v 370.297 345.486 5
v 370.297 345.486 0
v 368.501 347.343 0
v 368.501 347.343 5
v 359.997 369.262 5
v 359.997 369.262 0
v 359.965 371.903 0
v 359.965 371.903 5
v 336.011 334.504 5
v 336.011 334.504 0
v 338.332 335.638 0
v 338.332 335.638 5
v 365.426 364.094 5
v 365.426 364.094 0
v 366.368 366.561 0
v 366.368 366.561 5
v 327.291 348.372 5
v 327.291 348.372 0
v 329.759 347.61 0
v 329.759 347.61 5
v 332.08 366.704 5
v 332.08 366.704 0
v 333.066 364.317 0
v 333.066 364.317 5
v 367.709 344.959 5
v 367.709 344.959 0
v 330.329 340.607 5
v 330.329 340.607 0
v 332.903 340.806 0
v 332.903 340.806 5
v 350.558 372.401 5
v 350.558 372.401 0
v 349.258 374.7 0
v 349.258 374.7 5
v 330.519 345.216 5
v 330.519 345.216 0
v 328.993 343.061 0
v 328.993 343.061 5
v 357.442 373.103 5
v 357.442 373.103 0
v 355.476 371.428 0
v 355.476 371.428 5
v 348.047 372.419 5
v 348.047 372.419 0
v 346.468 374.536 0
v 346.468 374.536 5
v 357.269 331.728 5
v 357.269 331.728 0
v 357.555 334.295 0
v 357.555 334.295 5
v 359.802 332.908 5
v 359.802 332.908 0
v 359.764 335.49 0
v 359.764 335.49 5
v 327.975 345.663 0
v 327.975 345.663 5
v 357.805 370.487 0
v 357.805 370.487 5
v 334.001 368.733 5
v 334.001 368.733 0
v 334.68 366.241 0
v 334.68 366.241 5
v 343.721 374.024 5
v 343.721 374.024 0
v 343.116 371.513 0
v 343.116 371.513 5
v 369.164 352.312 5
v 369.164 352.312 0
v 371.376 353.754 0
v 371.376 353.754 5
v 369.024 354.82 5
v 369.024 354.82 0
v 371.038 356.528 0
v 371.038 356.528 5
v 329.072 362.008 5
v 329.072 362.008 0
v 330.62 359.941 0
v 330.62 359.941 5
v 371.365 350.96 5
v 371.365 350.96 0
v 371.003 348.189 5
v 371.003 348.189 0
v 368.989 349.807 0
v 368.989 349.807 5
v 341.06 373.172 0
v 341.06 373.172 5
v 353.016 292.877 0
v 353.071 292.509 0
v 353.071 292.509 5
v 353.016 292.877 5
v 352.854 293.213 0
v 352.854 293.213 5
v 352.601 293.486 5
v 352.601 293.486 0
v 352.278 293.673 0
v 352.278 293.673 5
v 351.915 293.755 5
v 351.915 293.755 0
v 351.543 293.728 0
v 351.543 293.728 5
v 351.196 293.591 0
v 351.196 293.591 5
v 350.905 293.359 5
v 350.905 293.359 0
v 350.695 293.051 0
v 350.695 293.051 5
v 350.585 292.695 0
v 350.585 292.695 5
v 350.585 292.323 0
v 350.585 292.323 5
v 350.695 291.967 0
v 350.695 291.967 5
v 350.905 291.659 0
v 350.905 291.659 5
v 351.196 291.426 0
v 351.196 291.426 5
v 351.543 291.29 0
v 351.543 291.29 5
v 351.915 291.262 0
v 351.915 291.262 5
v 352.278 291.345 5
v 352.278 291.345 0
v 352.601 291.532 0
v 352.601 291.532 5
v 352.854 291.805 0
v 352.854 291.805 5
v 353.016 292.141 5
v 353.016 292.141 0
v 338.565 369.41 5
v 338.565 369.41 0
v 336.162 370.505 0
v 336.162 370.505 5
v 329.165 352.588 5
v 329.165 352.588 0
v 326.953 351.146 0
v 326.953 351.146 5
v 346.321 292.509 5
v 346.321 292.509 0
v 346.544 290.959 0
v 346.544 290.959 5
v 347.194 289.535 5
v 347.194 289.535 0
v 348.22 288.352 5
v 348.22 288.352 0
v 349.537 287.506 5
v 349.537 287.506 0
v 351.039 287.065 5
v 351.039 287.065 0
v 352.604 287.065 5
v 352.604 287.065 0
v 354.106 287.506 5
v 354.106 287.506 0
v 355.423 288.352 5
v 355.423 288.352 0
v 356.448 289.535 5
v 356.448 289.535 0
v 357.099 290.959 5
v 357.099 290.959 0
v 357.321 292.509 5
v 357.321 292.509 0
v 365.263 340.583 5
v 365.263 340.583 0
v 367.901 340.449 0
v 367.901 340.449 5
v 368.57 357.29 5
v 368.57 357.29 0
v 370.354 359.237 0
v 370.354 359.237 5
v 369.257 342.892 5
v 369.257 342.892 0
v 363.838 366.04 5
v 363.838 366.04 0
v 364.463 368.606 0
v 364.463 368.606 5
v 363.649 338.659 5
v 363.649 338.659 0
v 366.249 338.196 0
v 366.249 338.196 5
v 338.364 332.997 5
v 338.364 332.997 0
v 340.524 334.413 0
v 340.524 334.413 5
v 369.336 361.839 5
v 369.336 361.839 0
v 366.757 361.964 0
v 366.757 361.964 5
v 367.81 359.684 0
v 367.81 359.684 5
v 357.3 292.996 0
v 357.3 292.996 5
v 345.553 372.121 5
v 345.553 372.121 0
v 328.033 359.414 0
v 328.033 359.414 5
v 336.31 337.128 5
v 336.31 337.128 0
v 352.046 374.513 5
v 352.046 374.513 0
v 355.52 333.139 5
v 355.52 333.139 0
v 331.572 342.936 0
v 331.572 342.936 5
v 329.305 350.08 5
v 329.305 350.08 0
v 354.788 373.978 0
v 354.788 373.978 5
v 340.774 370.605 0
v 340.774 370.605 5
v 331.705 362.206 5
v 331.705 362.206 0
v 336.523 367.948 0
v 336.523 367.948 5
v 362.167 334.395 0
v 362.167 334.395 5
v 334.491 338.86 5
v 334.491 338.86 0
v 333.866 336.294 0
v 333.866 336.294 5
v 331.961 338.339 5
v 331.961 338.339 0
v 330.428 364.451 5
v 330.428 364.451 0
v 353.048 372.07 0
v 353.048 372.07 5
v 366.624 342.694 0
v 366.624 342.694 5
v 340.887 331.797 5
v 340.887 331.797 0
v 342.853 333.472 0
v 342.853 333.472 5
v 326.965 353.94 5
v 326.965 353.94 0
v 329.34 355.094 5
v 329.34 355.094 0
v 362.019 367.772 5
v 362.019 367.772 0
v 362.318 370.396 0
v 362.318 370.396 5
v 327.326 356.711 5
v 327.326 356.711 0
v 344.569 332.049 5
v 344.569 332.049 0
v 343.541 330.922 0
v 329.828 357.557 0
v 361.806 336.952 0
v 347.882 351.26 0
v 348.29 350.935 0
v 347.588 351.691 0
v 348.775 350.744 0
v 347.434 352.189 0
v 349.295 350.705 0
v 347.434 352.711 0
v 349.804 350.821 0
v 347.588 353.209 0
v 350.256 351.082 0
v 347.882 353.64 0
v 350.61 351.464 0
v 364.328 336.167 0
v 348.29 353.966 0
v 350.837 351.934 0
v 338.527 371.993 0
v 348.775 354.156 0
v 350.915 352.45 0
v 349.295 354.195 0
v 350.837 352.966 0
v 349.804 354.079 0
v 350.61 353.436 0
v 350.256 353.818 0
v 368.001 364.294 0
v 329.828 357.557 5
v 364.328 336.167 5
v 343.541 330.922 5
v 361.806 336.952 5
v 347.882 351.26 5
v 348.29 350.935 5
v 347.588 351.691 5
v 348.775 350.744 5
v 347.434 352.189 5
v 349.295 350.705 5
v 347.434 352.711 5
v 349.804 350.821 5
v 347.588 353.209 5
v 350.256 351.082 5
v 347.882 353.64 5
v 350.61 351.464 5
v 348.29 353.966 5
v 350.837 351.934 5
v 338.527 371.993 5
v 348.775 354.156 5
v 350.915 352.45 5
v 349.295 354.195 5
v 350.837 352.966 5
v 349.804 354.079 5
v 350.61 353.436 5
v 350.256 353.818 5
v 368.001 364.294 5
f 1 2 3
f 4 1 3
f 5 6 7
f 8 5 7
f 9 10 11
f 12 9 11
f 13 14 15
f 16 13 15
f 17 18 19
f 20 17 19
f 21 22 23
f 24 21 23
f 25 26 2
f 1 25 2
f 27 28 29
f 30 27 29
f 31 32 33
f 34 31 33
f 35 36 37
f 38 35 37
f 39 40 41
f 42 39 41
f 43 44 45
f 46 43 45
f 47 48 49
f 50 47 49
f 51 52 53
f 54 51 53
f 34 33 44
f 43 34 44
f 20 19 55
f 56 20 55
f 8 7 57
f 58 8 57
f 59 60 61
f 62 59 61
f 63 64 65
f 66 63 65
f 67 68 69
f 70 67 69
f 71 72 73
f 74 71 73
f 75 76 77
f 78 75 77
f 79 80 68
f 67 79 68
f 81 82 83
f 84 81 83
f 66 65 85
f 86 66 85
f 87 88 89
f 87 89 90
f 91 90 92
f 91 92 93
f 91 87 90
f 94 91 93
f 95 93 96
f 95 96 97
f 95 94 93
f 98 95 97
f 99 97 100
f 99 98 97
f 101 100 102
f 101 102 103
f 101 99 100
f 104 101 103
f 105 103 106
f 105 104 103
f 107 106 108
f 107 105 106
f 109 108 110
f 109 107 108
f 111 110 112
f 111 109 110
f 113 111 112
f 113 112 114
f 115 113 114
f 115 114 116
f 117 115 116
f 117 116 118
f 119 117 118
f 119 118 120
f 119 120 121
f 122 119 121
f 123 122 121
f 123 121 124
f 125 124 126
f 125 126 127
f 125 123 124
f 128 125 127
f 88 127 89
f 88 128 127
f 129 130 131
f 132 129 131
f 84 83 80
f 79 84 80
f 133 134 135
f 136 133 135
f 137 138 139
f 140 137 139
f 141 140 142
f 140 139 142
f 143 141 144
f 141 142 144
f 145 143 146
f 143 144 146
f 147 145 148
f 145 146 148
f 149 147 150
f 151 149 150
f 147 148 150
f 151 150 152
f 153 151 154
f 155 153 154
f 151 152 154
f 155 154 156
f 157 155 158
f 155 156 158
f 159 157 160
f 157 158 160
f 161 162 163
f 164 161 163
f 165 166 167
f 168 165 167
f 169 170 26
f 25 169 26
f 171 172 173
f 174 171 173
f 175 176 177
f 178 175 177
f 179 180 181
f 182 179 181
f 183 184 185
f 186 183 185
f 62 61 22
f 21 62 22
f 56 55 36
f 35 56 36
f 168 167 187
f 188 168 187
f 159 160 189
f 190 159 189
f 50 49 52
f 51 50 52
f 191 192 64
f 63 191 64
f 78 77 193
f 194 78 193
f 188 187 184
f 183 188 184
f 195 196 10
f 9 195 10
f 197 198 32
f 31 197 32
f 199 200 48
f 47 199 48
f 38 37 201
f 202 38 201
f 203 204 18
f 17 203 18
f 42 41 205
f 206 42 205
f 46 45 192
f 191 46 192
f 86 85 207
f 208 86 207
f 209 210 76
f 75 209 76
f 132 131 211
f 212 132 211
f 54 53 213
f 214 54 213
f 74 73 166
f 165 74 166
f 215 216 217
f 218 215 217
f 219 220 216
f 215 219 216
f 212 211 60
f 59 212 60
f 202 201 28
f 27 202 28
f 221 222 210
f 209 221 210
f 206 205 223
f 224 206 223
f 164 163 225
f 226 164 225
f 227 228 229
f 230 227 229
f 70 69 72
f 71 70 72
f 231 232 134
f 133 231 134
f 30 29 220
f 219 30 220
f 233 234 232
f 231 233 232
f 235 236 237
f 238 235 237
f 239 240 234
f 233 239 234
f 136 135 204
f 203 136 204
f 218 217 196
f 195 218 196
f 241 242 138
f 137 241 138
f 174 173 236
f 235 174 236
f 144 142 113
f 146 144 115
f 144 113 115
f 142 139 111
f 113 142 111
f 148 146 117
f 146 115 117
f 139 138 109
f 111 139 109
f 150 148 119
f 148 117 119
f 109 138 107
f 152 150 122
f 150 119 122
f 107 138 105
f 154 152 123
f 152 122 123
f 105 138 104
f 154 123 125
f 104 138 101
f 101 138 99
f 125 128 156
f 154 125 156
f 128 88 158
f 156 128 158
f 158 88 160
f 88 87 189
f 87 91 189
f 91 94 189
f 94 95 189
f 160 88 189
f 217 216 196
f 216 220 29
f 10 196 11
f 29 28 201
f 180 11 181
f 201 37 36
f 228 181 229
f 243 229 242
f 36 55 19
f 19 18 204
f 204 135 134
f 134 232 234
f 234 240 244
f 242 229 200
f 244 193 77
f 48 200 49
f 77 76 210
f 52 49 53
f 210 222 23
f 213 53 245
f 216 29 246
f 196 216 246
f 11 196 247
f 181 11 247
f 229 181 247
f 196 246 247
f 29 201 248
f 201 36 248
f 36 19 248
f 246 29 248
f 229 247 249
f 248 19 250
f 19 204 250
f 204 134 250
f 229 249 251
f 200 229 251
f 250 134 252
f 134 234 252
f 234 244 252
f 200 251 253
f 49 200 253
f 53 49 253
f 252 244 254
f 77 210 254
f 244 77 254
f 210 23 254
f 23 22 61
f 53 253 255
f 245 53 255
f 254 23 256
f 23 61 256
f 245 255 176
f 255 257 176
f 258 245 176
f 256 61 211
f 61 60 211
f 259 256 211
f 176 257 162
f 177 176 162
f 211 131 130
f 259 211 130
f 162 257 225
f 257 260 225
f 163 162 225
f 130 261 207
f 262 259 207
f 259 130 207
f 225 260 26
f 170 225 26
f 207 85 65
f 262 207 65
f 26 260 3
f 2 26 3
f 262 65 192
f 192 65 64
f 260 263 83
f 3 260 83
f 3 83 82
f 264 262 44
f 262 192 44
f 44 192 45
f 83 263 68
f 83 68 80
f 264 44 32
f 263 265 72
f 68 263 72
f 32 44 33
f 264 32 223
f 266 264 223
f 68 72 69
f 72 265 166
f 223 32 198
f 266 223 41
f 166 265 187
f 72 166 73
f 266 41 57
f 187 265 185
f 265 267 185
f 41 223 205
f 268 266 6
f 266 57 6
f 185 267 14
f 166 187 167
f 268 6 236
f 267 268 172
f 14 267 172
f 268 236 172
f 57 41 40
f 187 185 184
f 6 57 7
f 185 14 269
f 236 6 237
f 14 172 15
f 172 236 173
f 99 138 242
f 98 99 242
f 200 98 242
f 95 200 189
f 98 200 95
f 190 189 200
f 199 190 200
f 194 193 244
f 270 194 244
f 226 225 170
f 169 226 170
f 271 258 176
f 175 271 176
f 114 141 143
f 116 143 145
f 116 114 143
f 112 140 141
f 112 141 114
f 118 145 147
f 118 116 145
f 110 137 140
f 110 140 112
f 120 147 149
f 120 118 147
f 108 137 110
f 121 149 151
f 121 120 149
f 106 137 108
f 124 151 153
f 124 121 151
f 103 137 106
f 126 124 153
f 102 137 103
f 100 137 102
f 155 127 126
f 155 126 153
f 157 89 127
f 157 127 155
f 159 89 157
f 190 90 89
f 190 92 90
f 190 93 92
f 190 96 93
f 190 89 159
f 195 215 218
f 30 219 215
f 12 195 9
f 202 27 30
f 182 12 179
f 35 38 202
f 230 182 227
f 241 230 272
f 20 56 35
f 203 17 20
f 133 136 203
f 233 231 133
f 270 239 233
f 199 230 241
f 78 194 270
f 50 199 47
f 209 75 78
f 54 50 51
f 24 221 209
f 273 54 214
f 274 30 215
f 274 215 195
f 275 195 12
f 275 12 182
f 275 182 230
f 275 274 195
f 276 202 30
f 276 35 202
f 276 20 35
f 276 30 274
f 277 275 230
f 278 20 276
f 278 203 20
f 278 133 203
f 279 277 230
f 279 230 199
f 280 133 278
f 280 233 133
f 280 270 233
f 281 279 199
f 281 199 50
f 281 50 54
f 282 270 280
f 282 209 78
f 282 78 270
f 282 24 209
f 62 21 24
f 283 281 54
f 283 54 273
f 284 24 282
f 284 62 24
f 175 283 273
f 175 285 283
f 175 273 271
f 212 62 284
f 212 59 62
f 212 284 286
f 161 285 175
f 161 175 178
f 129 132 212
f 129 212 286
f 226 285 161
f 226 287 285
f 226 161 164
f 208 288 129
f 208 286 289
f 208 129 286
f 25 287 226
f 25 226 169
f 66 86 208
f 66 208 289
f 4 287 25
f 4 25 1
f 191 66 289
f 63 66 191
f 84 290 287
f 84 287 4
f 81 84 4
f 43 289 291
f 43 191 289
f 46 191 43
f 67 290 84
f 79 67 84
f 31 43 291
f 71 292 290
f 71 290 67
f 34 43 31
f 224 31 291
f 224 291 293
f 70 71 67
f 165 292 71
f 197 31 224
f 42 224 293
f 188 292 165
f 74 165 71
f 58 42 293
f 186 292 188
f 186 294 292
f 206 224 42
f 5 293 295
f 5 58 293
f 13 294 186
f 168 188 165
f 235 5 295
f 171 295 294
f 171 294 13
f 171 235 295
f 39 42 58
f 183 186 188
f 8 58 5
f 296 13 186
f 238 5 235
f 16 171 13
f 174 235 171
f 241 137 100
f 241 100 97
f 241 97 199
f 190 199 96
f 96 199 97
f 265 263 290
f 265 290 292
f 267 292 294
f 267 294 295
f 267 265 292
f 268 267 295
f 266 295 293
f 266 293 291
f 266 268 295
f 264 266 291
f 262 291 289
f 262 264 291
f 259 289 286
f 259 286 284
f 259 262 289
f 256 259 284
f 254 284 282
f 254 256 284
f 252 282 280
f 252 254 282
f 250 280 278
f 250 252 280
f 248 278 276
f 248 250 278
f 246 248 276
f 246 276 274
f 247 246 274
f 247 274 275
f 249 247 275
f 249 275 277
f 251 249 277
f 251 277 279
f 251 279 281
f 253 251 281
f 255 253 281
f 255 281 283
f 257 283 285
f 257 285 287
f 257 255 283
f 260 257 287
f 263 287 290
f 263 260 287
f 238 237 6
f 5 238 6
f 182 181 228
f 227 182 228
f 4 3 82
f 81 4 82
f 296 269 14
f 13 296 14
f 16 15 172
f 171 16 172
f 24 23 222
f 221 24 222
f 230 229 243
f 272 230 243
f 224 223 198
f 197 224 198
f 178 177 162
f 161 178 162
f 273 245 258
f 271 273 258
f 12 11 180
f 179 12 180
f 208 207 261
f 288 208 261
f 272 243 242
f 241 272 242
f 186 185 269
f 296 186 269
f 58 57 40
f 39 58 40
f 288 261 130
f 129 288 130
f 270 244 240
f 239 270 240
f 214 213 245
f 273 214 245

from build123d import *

# Parameters (mm, degrees)
SKETCH1_R           = 1.25
SKETCH1_R_2         = 1.75
BOSS_EXTRUDE2_DEPTH = 5


with BuildPart() as part:
    # Sketch1 → Boss-Extrude2 (new body)
    with BuildSketch(Plane.XY):
        with BuildLine():
            Line((349.257683179, 374.699911371), (348.046522548, 372.418831878))
            Line((348.046522548, 372.418831878), (346.468308818, 374.536137019))
            Line((346.468308818, 374.536137019), (345.55259362, 372.121245841))
            Line((345.55259362, 372.121245841), (343.721455877, 374.024052769))
            Line((343.721455877, 374.024052769), (343.115627486, 371.513434183))
            Line((343.115627486, 371.513434183), (341.060443866, 373.171734495))
            Line((341.060443866, 373.171734495), (340.774056559, 370.604982455))
            Line((340.774056559, 370.604982455), (338.527238535, 371.992623765))
            Line((338.527238535, 371.992623765), (338.564808811, 369.410217484))
            Line((338.564808811, 369.410217484), (336.161790046, 370.505315861))
            Line((336.161790046, 370.505315861), (336.522725398, 367.947981428))
            Line((336.522725398, 367.947981428), (334.001402933, 368.733266515))
            Line((334.001402933, 368.733266515), (334.680011196, 366.241334623))
            Line((334.680011196, 366.241334623), (332.080147792, 366.704422005))
            Line((332.080147792, 366.704422005), (333.065726908, 364.317191908))
            Line((333.065726908, 364.317191908), (330.428323965, 364.450778421))
            Line((330.428323965, 364.450778421), (331.705330762, 362.205898164))
            Line((331.705330762, 362.205898164), (329.0719817, 362.007877067))
            Line((329.0719817, 362.007877067), (330.620277019, 359.940749753))
            Line((330.620277019, 359.940749753), (328.032511325, 359.414243959))
            Line((328.032511325, 359.414243959), (329.827677623, 357.55746942))
            Line((329.827677623, 357.55746942), (327.326305908, 356.71078224))
            Line((327.326305908, 356.71078224), (329.34003234, 355.093642919))
            Line((329.34003234, 355.093642919), (326.964502731, 353.940127114))
            Line((326.964502731, 353.940127114), (329.165031629, 352.588126266))
            Line((329.165031629, 352.588126266), (326.952807646, 351.145973471))
            Line((326.952807646, 351.145973471), (329.305435355, 350.080432955))
            Line((329.305435355, 350.080432955), (327.291405091, 348.37238678))
            Line((327.291405091, 348.37238678), (329.759029266, 347.610110808))
            Line((329.759029266, 347.610110808), (327.974955183, 345.663108161))
            Line((327.974955183, 345.663108161), (330.518659917, 345.21611828))
            Line((330.518659917, 345.21611828), (328.992677928, 343.060864557))
            Line((328.992677928, 343.060864557), (331.572347478, 342.936210064))
            Line((331.572347478, 342.936210064), (330.328523231, 340.606694904))
            Line((330.328523231, 340.606694904), (332.903474666, 340.806341675))
            Line((332.903474666, 340.806341675), (331.961424013, 338.339302922))
            Line((331.961424013, 338.339302922), (334.491048812, 338.860102409))
            Line((334.491048812, 338.860102409), (333.865628454, 336.294446739))
            Line((333.865628454, 336.294446739), (336.310032922, 337.128185622))
            Line((336.310032922, 337.128185622), (336.011106111, 334.504374958))
            Line((336.011106111, 334.504374958), (338.331740529, 335.637904676))
            Line((338.331740529, 335.637904676), (338.364021521, 332.997318079))
            Line((338.364021521, 332.997318079), (340.524288099, 334.412762192))
            Line((340.524288099, 334.412762192), (340.887267801, 331.797043291))
            Line((340.887267801, 331.797043291), (342.853097845, 333.4720794))
            Line((342.853097845, 333.4720794), (343.541051852, 330.922479643))
            Line((343.541051852, 330.922479643), (344.568787794, 332.049317014))
            Line((344.568787794, 332.049317014), (346.321351139, 292.508956491))
            ThreePointArc((346.321351139, 292.508956491), (351.821351139, 287.008956491), (357.321351139, 292.508956491))
            Line((357.321351139, 292.508956491), (357.299783306, 292.995557967))
            Line((357.299783306, 292.995557967), (355.520486612, 333.139061449))
            Line((355.520486612, 333.139061449), (357.268666905, 331.728478036))
            Line((357.268666905, 331.728478036), (357.555054212, 334.295230076))
            Line((357.555054212, 334.295230076), (359.801872235, 332.907588766))
            Line((359.801872235, 332.907588766), (359.76430196, 335.489995047))
            Line((359.76430196, 335.489995047), (362.167320725, 334.394896671))
            Line((362.167320725, 334.394896671), (361.806385373, 336.952231103))
            Line((361.806385373, 336.952231103), (364.327707838, 336.166946016))
            Line((364.327707838, 336.166946016), (363.649099575, 338.658877908))
            Line((363.649099575, 338.658877908), (366.248962979, 338.195790526))
            Line((366.248962979, 338.195790526), (365.263383863, 340.583020623))
            Line((365.263383863, 340.583020623), (367.900786806, 340.449434111))
            Line((367.900786806, 340.449434111), (366.623780008, 342.694314367))
            Line((366.623780008, 342.694314367), (369.257129071, 342.892335464))
            Line((369.257129071, 342.892335464), (367.708833752, 344.959462778))
            Line((367.708833752, 344.959462778), (370.296599446, 345.485968572))
            Line((370.296599446, 345.485968572), (368.501433148, 347.342743111))
            Line((368.501433148, 347.342743111), (371.002804863, 348.189430292))
            Line((371.002804863, 348.189430292), (368.98907843, 349.806569612))
            Line((368.98907843, 349.806569612), (371.36460804, 350.960085417))
            Line((371.36460804, 350.960085417), (369.164079142, 352.312086265))
            Line((369.164079142, 352.312086265), (371.376303125, 353.754239061))
            Line((371.376303125, 353.754239061), (369.023675416, 354.819779576))
            Line((369.023675416, 354.819779576), (371.03770568, 356.527825751))
            Line((371.03770568, 356.527825751), (368.570081505, 357.290101724))
            Line((368.570081505, 357.290101724), (370.354155588, 359.23710437))
            Line((370.354155588, 359.23710437), (367.810450854, 359.684094251))
            Line((367.810450854, 359.684094251), (369.336432842, 361.839347974))
            Line((369.336432842, 361.839347974), (366.756763293, 361.964002467))
            Line((366.756763293, 361.964002467), (368.00058754, 364.293517627))
            Line((368.00058754, 364.293517627), (365.425636104, 364.093870857))
            Line((365.425636104, 364.093870857), (366.367686758, 366.560909609))
            Line((366.367686758, 366.560909609), (363.838061959, 366.040110123))
            Line((363.838061959, 366.040110123), (364.463482317, 368.605765792))
            Line((364.463482317, 368.605765792), (362.019077849, 367.77202691))
            Line((362.019077849, 367.77202691), (362.31800466, 370.395837574))
            Line((362.31800466, 370.395837574), (359.997370241, 369.262307855))
            Line((359.997370241, 369.262307855), (359.96508925, 371.902894452))
            Line((359.96508925, 371.902894452), (357.804822672, 370.487450339))
            Line((357.804822672, 370.487450339), (357.441842969, 373.103169241))
            Line((357.441842969, 373.103169241), (355.476012926, 371.428133131))
            Line((355.476012926, 371.428133131), (354.788058919, 373.977732888))
            Line((354.788058919, 373.977732888), (353.047667725, 372.069521103))
            Line((353.047667725, 372.069521103), (352.045588858, 374.512793004))
            Line((352.045588858, 374.512793004), (350.558083522, 372.401499183))
            Line((350.558083522, 372.401499183), (349.257683179, 374.699911371))
        make_face()
        with Locations((351.821351139, 292.508956491)):
            Circle(SKETCH1_R, mode=Mode.SUBTRACT)
        with Locations((349.164555385, 352.450106266)):
            Circle(SKETCH1_R_2, mode=Mode.SUBTRACT)
    extrude(amount=BOSS_EXTRUDE2_DEPTH)


solid = part.part
